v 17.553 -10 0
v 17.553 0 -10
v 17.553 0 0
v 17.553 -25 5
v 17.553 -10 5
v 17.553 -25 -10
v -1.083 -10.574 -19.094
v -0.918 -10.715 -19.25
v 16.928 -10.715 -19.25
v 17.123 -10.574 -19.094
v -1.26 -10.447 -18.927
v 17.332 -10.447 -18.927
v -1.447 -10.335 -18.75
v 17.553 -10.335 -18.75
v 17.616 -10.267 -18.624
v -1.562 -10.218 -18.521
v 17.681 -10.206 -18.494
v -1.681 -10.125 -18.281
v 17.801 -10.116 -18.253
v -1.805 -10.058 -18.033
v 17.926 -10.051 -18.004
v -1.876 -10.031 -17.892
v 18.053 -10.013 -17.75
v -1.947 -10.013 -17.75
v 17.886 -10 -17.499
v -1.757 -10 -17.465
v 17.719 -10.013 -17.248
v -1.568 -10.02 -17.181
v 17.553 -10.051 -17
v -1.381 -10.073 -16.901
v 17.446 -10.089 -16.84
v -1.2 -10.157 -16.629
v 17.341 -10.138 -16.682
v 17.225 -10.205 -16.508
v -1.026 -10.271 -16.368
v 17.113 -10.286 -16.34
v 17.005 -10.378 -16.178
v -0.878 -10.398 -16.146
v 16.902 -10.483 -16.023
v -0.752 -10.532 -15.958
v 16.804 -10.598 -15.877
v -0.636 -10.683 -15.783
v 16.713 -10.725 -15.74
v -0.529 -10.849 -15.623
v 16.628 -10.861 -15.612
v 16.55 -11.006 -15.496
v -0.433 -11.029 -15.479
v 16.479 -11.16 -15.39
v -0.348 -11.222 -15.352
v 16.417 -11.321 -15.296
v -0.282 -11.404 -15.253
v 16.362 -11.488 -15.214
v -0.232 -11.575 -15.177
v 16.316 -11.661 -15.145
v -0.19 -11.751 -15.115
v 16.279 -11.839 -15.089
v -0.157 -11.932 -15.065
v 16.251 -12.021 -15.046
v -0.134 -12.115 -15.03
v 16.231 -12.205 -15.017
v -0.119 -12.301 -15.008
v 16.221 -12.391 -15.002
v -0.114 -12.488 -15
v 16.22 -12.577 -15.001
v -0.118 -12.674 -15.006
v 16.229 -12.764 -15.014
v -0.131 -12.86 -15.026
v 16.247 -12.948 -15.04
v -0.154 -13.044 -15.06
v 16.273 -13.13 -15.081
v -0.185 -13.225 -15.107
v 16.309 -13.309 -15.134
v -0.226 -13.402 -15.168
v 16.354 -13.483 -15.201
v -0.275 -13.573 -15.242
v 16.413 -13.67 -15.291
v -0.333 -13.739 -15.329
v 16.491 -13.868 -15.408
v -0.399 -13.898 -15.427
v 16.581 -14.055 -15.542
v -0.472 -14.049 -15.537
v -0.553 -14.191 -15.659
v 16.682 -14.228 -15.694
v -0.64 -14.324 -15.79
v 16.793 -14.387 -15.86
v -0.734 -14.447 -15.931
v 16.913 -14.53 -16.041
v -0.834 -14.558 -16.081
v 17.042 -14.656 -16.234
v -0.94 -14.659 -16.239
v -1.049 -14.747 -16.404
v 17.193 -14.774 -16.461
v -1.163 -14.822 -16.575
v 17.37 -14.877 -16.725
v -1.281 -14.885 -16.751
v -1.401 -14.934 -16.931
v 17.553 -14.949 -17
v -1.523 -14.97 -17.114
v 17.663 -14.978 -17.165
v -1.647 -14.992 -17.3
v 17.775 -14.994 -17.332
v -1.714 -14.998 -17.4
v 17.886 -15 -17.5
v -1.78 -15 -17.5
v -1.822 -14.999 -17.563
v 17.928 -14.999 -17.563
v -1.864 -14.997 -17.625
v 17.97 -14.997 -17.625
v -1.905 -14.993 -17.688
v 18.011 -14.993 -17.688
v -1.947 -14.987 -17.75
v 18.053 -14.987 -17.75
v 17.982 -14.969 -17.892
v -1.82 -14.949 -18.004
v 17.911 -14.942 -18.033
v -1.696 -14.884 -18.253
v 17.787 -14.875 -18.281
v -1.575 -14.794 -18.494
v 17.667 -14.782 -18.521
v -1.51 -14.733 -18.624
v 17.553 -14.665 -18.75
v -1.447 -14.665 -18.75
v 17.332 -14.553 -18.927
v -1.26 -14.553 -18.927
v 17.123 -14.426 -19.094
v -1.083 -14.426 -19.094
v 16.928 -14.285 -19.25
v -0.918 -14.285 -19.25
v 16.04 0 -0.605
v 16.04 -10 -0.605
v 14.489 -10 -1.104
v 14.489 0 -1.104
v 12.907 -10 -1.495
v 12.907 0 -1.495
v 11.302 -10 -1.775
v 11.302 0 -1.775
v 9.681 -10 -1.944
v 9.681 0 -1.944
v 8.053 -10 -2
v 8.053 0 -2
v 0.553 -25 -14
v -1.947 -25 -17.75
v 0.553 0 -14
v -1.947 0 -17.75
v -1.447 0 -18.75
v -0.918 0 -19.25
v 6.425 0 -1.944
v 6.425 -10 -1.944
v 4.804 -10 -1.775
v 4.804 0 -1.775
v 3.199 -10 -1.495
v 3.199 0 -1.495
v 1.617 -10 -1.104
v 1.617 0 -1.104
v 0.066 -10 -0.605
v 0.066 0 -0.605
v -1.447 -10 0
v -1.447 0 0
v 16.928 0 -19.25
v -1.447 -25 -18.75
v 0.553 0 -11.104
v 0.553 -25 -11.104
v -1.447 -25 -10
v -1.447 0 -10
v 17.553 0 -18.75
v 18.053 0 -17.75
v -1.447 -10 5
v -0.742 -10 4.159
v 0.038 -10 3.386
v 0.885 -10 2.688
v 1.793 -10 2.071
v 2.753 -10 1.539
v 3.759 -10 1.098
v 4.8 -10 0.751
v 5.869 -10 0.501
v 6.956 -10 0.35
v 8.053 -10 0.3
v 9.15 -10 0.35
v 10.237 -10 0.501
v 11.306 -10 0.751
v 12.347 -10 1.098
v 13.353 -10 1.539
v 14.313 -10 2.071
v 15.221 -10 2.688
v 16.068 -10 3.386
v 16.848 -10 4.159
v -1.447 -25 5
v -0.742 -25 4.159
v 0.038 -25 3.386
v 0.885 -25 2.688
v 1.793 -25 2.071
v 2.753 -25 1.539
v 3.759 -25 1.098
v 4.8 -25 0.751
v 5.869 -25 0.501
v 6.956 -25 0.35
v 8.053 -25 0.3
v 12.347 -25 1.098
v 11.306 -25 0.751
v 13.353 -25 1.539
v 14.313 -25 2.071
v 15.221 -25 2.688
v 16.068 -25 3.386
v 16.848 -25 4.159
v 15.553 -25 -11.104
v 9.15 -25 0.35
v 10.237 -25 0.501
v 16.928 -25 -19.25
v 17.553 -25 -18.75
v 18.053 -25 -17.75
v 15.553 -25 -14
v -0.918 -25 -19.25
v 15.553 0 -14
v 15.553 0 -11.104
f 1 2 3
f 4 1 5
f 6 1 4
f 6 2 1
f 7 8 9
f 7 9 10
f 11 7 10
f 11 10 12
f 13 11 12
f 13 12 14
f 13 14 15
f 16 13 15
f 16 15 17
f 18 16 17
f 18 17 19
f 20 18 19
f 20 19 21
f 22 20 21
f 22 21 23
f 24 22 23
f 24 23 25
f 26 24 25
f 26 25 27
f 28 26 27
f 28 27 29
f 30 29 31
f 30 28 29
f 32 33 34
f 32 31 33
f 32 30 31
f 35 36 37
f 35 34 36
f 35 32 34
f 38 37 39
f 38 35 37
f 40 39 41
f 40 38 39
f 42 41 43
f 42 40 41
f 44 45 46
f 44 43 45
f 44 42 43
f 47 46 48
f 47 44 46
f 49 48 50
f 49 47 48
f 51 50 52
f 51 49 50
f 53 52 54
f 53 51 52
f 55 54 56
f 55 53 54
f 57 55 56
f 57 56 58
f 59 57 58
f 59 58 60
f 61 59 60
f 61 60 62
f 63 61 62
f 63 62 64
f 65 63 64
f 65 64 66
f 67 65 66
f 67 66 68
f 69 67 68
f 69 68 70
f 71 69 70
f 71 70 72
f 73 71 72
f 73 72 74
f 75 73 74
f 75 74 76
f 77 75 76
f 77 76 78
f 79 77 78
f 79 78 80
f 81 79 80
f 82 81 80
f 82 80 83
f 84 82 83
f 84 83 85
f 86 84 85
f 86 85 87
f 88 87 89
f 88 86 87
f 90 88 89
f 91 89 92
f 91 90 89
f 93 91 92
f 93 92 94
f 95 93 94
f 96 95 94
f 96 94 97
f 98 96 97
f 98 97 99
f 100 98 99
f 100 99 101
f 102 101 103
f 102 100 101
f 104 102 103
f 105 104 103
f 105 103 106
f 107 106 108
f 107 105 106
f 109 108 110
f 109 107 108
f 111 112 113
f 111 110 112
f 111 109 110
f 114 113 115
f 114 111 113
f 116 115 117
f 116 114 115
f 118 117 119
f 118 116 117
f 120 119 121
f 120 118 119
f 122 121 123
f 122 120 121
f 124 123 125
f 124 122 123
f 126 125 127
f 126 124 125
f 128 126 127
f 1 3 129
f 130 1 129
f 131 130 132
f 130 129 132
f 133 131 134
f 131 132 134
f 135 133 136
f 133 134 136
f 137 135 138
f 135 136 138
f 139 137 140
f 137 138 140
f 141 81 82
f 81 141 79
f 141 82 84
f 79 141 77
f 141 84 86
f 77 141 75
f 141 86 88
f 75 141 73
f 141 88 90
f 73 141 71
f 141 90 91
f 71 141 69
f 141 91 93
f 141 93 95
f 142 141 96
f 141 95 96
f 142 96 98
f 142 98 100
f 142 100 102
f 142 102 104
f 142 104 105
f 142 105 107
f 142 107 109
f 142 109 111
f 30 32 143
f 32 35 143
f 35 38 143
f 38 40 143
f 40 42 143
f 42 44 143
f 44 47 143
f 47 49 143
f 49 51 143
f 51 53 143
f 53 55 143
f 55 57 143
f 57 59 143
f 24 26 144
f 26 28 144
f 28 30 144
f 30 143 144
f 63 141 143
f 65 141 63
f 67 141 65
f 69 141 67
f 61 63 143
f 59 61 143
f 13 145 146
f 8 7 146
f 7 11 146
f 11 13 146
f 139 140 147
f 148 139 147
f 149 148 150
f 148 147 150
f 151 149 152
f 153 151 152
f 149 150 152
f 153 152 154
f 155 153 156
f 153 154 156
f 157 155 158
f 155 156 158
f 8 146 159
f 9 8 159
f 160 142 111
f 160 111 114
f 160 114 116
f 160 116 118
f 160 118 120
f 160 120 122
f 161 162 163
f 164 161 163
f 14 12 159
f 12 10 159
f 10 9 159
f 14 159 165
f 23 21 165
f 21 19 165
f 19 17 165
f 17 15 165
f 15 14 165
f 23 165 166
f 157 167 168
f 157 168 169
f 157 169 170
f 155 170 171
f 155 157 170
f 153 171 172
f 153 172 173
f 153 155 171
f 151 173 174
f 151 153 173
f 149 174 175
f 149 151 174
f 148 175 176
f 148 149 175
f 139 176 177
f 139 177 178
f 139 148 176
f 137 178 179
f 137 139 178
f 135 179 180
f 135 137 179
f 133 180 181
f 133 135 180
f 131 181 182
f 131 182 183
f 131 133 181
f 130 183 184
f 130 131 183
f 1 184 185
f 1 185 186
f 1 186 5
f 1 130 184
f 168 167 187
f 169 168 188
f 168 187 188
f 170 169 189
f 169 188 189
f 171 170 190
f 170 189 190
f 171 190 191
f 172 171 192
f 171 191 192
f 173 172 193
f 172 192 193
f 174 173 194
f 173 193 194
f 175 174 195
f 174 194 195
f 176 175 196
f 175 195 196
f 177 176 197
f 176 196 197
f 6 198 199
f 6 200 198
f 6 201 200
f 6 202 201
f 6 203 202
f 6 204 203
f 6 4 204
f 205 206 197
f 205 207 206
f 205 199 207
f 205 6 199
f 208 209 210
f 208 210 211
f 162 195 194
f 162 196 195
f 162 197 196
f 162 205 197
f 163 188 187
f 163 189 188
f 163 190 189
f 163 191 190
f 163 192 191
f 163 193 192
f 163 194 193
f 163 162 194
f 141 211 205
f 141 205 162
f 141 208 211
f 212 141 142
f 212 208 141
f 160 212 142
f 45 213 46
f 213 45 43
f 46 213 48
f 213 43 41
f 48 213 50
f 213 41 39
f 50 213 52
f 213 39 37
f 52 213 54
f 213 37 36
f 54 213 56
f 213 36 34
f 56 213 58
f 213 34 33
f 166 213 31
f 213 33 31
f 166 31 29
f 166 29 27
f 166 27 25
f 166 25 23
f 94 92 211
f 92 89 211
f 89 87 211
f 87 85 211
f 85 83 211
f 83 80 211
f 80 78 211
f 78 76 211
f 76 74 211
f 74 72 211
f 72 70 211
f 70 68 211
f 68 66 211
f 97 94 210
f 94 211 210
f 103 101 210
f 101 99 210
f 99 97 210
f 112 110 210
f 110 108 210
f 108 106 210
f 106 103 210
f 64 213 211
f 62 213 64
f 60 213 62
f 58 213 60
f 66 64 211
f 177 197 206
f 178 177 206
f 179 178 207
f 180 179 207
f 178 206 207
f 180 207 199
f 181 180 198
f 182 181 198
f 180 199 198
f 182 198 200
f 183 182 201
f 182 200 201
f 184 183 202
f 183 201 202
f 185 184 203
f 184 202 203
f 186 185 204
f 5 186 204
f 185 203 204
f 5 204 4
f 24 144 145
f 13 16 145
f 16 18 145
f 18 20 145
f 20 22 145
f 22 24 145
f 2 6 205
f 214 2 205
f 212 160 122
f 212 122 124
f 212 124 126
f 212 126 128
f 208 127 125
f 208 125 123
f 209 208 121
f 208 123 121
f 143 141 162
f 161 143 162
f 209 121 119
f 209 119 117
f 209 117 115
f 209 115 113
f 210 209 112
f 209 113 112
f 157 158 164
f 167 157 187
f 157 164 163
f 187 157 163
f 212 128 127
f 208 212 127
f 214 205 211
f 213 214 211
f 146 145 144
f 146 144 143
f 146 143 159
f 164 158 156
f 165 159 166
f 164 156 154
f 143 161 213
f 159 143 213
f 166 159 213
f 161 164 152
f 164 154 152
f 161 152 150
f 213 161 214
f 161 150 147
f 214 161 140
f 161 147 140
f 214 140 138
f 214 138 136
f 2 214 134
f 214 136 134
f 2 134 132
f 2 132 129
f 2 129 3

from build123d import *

# Parameters (mm, degrees)
F1_DEPTH       = 25
F3_DEPTH       = 25
F5_DEPTH       = 10
F6_DEPTH       = 5
F8_DEPTH       = 25
F10_DEPTH      = 25
F10_DEPTH_BACK = 25


with BuildPart() as f1:
    # F0 (on Front) → F1 (new body)
    with BuildSketch(Plane.XZ):
        with BuildLine():
            ThreePointArc((8.0529790092, -2), (3.1988570495, -1.4945793088), (-1.4470209908, 0))
            Line((-1.4470209908, 0), (-1.4470209908, -17))
            Line((-1.4470209908, -17), (17.5529790092, -17))
            Line((17.5529790092, -17), (17.5529790092, 0))
            ThreePointArc((17.5529790092, 0), (12.907100969, -1.4945793088), (8.0529790092, -2))
        make_face()
        Polygon((17.5529790092, -17), (-1.4470209908, -17), (-1.9470209908, -17.75), (18.0529790092, -17.75), align=None)
        Polygon((18.0529790092, -17.75), (-1.9470209908, -17.75), (-1.4470209908, -18.75), (17.5529790092, -18.75), align=None)
        Polygon((17.5529790092, -18.75), (-1.4470209908, -18.75), (-0.9180161287, -19.25), (16.9282071292, -19.25), align=None)
        with BuildLine():
            Line((8.0529790092, 0), (-1.4470209908, 0))
            ThreePointArc((-1.4470209908, 0), (3.1988570495, -1.4945793088), (8.0529790092, -2))
            Line((8.0529790092, -2), (8.0529790092, 0))
        make_face()
        with BuildLine():
            Line((17.5529790092, 0), (8.0529790092, 0))
            Line((8.0529790092, 0), (8.0529790092, -2))
            ThreePointArc((8.0529790092, -2), (12.907100969, -1.4945793088), (17.5529790092, 0))
        make_face()
    extrude(amount=F1_DEPTH)

    # F2 (on face) → F3 (cut)
    with BuildSketch(Plane.XZ.offset(25)):
        Polygon((-1.4470209908, -14), (-1.4470209908, -17), (0.5529790092, -14), (0.5529790092, -11.1042056233), (-1.4470209908, -11.1042056233), align=None)
        Polygon((-1.4470209908, -10), (-1.4470209908, -11.1042056233), (0.5529790092, -11.1042056233), align=None)
        Polygon((17.5529790092, -10), (15.5529790092, -11.1042056233), (15.5529790092, -14), (17.5529790092, -17), align=None)
    extrude(amount=-F3_DEPTH, mode=Mode.SUBTRACT)

    # F4 (on face) → F5 (cut)
    with BuildSketch(Plane(origin=(0, 0, 0), x_dir=(-1, 0, 0), z_dir=(0, 1, 0))):
        with BuildLine():
            Line((-8.0529790092, -2), (-8.0529790092, 0))
            Line((-8.0529790092, 0), (-17.5529790092, 0))
            ThreePointArc((-17.5529790092, 0), (-12.907100969, -1.4945793088), (-8.0529790092, -2))
        make_face()
        with BuildLine():
            Line((1.4470209908, 0), (-8.0529790092, 0))
            Line((-8.0529790092, 0), (-8.0529790092, -2))
            ThreePointArc((-8.0529790092, -2), (-3.1988570495, -1.4945793088), (1.4470209908, 0))
        make_face()
    extrude(amount=-F5_DEPTH, mode=Mode.SUBTRACT)

    # F6 (add): a face of the model
    f6_faces = [f1.faces().sort_by_distance(p)[0] for p in [
        (8.0529790092, -17.5, 0),
    ]]
    extrude(f6_faces, amount=F6_DEPTH)

    # F7 (on face) → F8 (cut)
    with BuildSketch(Plane.XZ.offset(25)):
        with BuildLine():
            Line((17.5529790092, 5), (-1.4470209908, 5))
            ThreePointArc((-1.4470209908, 5), (2.7534507283, 1.5392513471), (8.0529790092, 0.3))
            ThreePointArc((8.0529790092, 0.3), (13.3525072901, 1.5392513471), (17.5529790092, 5))
        make_face()
    extrude(amount=-F8_DEPTH, mode=Mode.SUBTRACT)

    # F9 (on face) → F10 (cut, two sides)
    with BuildSketch(Plane.YZ.offset(17.5529790092)) as f10_sk:
        with BuildLine():
            Line((-15, -17.5), (-10, -17.5))
            ThreePointArc((-10, -17.5), (-12.5, -15), (-15, -17.5))
        make_face()
        with BuildLine():
            ThreePointArc((-15, -17.5), (-12.5, -20), (-10, -17.5))
            Line((-10, -17.5), (-15, -17.5))
        make_face()
    extrude(amount=-F10_DEPTH, mode=Mode.SUBTRACT)
    extrude(f10_sk.sketch, amount=F10_DEPTH_BACK, mode=Mode.SUBTRACT)


solid = f1.part
